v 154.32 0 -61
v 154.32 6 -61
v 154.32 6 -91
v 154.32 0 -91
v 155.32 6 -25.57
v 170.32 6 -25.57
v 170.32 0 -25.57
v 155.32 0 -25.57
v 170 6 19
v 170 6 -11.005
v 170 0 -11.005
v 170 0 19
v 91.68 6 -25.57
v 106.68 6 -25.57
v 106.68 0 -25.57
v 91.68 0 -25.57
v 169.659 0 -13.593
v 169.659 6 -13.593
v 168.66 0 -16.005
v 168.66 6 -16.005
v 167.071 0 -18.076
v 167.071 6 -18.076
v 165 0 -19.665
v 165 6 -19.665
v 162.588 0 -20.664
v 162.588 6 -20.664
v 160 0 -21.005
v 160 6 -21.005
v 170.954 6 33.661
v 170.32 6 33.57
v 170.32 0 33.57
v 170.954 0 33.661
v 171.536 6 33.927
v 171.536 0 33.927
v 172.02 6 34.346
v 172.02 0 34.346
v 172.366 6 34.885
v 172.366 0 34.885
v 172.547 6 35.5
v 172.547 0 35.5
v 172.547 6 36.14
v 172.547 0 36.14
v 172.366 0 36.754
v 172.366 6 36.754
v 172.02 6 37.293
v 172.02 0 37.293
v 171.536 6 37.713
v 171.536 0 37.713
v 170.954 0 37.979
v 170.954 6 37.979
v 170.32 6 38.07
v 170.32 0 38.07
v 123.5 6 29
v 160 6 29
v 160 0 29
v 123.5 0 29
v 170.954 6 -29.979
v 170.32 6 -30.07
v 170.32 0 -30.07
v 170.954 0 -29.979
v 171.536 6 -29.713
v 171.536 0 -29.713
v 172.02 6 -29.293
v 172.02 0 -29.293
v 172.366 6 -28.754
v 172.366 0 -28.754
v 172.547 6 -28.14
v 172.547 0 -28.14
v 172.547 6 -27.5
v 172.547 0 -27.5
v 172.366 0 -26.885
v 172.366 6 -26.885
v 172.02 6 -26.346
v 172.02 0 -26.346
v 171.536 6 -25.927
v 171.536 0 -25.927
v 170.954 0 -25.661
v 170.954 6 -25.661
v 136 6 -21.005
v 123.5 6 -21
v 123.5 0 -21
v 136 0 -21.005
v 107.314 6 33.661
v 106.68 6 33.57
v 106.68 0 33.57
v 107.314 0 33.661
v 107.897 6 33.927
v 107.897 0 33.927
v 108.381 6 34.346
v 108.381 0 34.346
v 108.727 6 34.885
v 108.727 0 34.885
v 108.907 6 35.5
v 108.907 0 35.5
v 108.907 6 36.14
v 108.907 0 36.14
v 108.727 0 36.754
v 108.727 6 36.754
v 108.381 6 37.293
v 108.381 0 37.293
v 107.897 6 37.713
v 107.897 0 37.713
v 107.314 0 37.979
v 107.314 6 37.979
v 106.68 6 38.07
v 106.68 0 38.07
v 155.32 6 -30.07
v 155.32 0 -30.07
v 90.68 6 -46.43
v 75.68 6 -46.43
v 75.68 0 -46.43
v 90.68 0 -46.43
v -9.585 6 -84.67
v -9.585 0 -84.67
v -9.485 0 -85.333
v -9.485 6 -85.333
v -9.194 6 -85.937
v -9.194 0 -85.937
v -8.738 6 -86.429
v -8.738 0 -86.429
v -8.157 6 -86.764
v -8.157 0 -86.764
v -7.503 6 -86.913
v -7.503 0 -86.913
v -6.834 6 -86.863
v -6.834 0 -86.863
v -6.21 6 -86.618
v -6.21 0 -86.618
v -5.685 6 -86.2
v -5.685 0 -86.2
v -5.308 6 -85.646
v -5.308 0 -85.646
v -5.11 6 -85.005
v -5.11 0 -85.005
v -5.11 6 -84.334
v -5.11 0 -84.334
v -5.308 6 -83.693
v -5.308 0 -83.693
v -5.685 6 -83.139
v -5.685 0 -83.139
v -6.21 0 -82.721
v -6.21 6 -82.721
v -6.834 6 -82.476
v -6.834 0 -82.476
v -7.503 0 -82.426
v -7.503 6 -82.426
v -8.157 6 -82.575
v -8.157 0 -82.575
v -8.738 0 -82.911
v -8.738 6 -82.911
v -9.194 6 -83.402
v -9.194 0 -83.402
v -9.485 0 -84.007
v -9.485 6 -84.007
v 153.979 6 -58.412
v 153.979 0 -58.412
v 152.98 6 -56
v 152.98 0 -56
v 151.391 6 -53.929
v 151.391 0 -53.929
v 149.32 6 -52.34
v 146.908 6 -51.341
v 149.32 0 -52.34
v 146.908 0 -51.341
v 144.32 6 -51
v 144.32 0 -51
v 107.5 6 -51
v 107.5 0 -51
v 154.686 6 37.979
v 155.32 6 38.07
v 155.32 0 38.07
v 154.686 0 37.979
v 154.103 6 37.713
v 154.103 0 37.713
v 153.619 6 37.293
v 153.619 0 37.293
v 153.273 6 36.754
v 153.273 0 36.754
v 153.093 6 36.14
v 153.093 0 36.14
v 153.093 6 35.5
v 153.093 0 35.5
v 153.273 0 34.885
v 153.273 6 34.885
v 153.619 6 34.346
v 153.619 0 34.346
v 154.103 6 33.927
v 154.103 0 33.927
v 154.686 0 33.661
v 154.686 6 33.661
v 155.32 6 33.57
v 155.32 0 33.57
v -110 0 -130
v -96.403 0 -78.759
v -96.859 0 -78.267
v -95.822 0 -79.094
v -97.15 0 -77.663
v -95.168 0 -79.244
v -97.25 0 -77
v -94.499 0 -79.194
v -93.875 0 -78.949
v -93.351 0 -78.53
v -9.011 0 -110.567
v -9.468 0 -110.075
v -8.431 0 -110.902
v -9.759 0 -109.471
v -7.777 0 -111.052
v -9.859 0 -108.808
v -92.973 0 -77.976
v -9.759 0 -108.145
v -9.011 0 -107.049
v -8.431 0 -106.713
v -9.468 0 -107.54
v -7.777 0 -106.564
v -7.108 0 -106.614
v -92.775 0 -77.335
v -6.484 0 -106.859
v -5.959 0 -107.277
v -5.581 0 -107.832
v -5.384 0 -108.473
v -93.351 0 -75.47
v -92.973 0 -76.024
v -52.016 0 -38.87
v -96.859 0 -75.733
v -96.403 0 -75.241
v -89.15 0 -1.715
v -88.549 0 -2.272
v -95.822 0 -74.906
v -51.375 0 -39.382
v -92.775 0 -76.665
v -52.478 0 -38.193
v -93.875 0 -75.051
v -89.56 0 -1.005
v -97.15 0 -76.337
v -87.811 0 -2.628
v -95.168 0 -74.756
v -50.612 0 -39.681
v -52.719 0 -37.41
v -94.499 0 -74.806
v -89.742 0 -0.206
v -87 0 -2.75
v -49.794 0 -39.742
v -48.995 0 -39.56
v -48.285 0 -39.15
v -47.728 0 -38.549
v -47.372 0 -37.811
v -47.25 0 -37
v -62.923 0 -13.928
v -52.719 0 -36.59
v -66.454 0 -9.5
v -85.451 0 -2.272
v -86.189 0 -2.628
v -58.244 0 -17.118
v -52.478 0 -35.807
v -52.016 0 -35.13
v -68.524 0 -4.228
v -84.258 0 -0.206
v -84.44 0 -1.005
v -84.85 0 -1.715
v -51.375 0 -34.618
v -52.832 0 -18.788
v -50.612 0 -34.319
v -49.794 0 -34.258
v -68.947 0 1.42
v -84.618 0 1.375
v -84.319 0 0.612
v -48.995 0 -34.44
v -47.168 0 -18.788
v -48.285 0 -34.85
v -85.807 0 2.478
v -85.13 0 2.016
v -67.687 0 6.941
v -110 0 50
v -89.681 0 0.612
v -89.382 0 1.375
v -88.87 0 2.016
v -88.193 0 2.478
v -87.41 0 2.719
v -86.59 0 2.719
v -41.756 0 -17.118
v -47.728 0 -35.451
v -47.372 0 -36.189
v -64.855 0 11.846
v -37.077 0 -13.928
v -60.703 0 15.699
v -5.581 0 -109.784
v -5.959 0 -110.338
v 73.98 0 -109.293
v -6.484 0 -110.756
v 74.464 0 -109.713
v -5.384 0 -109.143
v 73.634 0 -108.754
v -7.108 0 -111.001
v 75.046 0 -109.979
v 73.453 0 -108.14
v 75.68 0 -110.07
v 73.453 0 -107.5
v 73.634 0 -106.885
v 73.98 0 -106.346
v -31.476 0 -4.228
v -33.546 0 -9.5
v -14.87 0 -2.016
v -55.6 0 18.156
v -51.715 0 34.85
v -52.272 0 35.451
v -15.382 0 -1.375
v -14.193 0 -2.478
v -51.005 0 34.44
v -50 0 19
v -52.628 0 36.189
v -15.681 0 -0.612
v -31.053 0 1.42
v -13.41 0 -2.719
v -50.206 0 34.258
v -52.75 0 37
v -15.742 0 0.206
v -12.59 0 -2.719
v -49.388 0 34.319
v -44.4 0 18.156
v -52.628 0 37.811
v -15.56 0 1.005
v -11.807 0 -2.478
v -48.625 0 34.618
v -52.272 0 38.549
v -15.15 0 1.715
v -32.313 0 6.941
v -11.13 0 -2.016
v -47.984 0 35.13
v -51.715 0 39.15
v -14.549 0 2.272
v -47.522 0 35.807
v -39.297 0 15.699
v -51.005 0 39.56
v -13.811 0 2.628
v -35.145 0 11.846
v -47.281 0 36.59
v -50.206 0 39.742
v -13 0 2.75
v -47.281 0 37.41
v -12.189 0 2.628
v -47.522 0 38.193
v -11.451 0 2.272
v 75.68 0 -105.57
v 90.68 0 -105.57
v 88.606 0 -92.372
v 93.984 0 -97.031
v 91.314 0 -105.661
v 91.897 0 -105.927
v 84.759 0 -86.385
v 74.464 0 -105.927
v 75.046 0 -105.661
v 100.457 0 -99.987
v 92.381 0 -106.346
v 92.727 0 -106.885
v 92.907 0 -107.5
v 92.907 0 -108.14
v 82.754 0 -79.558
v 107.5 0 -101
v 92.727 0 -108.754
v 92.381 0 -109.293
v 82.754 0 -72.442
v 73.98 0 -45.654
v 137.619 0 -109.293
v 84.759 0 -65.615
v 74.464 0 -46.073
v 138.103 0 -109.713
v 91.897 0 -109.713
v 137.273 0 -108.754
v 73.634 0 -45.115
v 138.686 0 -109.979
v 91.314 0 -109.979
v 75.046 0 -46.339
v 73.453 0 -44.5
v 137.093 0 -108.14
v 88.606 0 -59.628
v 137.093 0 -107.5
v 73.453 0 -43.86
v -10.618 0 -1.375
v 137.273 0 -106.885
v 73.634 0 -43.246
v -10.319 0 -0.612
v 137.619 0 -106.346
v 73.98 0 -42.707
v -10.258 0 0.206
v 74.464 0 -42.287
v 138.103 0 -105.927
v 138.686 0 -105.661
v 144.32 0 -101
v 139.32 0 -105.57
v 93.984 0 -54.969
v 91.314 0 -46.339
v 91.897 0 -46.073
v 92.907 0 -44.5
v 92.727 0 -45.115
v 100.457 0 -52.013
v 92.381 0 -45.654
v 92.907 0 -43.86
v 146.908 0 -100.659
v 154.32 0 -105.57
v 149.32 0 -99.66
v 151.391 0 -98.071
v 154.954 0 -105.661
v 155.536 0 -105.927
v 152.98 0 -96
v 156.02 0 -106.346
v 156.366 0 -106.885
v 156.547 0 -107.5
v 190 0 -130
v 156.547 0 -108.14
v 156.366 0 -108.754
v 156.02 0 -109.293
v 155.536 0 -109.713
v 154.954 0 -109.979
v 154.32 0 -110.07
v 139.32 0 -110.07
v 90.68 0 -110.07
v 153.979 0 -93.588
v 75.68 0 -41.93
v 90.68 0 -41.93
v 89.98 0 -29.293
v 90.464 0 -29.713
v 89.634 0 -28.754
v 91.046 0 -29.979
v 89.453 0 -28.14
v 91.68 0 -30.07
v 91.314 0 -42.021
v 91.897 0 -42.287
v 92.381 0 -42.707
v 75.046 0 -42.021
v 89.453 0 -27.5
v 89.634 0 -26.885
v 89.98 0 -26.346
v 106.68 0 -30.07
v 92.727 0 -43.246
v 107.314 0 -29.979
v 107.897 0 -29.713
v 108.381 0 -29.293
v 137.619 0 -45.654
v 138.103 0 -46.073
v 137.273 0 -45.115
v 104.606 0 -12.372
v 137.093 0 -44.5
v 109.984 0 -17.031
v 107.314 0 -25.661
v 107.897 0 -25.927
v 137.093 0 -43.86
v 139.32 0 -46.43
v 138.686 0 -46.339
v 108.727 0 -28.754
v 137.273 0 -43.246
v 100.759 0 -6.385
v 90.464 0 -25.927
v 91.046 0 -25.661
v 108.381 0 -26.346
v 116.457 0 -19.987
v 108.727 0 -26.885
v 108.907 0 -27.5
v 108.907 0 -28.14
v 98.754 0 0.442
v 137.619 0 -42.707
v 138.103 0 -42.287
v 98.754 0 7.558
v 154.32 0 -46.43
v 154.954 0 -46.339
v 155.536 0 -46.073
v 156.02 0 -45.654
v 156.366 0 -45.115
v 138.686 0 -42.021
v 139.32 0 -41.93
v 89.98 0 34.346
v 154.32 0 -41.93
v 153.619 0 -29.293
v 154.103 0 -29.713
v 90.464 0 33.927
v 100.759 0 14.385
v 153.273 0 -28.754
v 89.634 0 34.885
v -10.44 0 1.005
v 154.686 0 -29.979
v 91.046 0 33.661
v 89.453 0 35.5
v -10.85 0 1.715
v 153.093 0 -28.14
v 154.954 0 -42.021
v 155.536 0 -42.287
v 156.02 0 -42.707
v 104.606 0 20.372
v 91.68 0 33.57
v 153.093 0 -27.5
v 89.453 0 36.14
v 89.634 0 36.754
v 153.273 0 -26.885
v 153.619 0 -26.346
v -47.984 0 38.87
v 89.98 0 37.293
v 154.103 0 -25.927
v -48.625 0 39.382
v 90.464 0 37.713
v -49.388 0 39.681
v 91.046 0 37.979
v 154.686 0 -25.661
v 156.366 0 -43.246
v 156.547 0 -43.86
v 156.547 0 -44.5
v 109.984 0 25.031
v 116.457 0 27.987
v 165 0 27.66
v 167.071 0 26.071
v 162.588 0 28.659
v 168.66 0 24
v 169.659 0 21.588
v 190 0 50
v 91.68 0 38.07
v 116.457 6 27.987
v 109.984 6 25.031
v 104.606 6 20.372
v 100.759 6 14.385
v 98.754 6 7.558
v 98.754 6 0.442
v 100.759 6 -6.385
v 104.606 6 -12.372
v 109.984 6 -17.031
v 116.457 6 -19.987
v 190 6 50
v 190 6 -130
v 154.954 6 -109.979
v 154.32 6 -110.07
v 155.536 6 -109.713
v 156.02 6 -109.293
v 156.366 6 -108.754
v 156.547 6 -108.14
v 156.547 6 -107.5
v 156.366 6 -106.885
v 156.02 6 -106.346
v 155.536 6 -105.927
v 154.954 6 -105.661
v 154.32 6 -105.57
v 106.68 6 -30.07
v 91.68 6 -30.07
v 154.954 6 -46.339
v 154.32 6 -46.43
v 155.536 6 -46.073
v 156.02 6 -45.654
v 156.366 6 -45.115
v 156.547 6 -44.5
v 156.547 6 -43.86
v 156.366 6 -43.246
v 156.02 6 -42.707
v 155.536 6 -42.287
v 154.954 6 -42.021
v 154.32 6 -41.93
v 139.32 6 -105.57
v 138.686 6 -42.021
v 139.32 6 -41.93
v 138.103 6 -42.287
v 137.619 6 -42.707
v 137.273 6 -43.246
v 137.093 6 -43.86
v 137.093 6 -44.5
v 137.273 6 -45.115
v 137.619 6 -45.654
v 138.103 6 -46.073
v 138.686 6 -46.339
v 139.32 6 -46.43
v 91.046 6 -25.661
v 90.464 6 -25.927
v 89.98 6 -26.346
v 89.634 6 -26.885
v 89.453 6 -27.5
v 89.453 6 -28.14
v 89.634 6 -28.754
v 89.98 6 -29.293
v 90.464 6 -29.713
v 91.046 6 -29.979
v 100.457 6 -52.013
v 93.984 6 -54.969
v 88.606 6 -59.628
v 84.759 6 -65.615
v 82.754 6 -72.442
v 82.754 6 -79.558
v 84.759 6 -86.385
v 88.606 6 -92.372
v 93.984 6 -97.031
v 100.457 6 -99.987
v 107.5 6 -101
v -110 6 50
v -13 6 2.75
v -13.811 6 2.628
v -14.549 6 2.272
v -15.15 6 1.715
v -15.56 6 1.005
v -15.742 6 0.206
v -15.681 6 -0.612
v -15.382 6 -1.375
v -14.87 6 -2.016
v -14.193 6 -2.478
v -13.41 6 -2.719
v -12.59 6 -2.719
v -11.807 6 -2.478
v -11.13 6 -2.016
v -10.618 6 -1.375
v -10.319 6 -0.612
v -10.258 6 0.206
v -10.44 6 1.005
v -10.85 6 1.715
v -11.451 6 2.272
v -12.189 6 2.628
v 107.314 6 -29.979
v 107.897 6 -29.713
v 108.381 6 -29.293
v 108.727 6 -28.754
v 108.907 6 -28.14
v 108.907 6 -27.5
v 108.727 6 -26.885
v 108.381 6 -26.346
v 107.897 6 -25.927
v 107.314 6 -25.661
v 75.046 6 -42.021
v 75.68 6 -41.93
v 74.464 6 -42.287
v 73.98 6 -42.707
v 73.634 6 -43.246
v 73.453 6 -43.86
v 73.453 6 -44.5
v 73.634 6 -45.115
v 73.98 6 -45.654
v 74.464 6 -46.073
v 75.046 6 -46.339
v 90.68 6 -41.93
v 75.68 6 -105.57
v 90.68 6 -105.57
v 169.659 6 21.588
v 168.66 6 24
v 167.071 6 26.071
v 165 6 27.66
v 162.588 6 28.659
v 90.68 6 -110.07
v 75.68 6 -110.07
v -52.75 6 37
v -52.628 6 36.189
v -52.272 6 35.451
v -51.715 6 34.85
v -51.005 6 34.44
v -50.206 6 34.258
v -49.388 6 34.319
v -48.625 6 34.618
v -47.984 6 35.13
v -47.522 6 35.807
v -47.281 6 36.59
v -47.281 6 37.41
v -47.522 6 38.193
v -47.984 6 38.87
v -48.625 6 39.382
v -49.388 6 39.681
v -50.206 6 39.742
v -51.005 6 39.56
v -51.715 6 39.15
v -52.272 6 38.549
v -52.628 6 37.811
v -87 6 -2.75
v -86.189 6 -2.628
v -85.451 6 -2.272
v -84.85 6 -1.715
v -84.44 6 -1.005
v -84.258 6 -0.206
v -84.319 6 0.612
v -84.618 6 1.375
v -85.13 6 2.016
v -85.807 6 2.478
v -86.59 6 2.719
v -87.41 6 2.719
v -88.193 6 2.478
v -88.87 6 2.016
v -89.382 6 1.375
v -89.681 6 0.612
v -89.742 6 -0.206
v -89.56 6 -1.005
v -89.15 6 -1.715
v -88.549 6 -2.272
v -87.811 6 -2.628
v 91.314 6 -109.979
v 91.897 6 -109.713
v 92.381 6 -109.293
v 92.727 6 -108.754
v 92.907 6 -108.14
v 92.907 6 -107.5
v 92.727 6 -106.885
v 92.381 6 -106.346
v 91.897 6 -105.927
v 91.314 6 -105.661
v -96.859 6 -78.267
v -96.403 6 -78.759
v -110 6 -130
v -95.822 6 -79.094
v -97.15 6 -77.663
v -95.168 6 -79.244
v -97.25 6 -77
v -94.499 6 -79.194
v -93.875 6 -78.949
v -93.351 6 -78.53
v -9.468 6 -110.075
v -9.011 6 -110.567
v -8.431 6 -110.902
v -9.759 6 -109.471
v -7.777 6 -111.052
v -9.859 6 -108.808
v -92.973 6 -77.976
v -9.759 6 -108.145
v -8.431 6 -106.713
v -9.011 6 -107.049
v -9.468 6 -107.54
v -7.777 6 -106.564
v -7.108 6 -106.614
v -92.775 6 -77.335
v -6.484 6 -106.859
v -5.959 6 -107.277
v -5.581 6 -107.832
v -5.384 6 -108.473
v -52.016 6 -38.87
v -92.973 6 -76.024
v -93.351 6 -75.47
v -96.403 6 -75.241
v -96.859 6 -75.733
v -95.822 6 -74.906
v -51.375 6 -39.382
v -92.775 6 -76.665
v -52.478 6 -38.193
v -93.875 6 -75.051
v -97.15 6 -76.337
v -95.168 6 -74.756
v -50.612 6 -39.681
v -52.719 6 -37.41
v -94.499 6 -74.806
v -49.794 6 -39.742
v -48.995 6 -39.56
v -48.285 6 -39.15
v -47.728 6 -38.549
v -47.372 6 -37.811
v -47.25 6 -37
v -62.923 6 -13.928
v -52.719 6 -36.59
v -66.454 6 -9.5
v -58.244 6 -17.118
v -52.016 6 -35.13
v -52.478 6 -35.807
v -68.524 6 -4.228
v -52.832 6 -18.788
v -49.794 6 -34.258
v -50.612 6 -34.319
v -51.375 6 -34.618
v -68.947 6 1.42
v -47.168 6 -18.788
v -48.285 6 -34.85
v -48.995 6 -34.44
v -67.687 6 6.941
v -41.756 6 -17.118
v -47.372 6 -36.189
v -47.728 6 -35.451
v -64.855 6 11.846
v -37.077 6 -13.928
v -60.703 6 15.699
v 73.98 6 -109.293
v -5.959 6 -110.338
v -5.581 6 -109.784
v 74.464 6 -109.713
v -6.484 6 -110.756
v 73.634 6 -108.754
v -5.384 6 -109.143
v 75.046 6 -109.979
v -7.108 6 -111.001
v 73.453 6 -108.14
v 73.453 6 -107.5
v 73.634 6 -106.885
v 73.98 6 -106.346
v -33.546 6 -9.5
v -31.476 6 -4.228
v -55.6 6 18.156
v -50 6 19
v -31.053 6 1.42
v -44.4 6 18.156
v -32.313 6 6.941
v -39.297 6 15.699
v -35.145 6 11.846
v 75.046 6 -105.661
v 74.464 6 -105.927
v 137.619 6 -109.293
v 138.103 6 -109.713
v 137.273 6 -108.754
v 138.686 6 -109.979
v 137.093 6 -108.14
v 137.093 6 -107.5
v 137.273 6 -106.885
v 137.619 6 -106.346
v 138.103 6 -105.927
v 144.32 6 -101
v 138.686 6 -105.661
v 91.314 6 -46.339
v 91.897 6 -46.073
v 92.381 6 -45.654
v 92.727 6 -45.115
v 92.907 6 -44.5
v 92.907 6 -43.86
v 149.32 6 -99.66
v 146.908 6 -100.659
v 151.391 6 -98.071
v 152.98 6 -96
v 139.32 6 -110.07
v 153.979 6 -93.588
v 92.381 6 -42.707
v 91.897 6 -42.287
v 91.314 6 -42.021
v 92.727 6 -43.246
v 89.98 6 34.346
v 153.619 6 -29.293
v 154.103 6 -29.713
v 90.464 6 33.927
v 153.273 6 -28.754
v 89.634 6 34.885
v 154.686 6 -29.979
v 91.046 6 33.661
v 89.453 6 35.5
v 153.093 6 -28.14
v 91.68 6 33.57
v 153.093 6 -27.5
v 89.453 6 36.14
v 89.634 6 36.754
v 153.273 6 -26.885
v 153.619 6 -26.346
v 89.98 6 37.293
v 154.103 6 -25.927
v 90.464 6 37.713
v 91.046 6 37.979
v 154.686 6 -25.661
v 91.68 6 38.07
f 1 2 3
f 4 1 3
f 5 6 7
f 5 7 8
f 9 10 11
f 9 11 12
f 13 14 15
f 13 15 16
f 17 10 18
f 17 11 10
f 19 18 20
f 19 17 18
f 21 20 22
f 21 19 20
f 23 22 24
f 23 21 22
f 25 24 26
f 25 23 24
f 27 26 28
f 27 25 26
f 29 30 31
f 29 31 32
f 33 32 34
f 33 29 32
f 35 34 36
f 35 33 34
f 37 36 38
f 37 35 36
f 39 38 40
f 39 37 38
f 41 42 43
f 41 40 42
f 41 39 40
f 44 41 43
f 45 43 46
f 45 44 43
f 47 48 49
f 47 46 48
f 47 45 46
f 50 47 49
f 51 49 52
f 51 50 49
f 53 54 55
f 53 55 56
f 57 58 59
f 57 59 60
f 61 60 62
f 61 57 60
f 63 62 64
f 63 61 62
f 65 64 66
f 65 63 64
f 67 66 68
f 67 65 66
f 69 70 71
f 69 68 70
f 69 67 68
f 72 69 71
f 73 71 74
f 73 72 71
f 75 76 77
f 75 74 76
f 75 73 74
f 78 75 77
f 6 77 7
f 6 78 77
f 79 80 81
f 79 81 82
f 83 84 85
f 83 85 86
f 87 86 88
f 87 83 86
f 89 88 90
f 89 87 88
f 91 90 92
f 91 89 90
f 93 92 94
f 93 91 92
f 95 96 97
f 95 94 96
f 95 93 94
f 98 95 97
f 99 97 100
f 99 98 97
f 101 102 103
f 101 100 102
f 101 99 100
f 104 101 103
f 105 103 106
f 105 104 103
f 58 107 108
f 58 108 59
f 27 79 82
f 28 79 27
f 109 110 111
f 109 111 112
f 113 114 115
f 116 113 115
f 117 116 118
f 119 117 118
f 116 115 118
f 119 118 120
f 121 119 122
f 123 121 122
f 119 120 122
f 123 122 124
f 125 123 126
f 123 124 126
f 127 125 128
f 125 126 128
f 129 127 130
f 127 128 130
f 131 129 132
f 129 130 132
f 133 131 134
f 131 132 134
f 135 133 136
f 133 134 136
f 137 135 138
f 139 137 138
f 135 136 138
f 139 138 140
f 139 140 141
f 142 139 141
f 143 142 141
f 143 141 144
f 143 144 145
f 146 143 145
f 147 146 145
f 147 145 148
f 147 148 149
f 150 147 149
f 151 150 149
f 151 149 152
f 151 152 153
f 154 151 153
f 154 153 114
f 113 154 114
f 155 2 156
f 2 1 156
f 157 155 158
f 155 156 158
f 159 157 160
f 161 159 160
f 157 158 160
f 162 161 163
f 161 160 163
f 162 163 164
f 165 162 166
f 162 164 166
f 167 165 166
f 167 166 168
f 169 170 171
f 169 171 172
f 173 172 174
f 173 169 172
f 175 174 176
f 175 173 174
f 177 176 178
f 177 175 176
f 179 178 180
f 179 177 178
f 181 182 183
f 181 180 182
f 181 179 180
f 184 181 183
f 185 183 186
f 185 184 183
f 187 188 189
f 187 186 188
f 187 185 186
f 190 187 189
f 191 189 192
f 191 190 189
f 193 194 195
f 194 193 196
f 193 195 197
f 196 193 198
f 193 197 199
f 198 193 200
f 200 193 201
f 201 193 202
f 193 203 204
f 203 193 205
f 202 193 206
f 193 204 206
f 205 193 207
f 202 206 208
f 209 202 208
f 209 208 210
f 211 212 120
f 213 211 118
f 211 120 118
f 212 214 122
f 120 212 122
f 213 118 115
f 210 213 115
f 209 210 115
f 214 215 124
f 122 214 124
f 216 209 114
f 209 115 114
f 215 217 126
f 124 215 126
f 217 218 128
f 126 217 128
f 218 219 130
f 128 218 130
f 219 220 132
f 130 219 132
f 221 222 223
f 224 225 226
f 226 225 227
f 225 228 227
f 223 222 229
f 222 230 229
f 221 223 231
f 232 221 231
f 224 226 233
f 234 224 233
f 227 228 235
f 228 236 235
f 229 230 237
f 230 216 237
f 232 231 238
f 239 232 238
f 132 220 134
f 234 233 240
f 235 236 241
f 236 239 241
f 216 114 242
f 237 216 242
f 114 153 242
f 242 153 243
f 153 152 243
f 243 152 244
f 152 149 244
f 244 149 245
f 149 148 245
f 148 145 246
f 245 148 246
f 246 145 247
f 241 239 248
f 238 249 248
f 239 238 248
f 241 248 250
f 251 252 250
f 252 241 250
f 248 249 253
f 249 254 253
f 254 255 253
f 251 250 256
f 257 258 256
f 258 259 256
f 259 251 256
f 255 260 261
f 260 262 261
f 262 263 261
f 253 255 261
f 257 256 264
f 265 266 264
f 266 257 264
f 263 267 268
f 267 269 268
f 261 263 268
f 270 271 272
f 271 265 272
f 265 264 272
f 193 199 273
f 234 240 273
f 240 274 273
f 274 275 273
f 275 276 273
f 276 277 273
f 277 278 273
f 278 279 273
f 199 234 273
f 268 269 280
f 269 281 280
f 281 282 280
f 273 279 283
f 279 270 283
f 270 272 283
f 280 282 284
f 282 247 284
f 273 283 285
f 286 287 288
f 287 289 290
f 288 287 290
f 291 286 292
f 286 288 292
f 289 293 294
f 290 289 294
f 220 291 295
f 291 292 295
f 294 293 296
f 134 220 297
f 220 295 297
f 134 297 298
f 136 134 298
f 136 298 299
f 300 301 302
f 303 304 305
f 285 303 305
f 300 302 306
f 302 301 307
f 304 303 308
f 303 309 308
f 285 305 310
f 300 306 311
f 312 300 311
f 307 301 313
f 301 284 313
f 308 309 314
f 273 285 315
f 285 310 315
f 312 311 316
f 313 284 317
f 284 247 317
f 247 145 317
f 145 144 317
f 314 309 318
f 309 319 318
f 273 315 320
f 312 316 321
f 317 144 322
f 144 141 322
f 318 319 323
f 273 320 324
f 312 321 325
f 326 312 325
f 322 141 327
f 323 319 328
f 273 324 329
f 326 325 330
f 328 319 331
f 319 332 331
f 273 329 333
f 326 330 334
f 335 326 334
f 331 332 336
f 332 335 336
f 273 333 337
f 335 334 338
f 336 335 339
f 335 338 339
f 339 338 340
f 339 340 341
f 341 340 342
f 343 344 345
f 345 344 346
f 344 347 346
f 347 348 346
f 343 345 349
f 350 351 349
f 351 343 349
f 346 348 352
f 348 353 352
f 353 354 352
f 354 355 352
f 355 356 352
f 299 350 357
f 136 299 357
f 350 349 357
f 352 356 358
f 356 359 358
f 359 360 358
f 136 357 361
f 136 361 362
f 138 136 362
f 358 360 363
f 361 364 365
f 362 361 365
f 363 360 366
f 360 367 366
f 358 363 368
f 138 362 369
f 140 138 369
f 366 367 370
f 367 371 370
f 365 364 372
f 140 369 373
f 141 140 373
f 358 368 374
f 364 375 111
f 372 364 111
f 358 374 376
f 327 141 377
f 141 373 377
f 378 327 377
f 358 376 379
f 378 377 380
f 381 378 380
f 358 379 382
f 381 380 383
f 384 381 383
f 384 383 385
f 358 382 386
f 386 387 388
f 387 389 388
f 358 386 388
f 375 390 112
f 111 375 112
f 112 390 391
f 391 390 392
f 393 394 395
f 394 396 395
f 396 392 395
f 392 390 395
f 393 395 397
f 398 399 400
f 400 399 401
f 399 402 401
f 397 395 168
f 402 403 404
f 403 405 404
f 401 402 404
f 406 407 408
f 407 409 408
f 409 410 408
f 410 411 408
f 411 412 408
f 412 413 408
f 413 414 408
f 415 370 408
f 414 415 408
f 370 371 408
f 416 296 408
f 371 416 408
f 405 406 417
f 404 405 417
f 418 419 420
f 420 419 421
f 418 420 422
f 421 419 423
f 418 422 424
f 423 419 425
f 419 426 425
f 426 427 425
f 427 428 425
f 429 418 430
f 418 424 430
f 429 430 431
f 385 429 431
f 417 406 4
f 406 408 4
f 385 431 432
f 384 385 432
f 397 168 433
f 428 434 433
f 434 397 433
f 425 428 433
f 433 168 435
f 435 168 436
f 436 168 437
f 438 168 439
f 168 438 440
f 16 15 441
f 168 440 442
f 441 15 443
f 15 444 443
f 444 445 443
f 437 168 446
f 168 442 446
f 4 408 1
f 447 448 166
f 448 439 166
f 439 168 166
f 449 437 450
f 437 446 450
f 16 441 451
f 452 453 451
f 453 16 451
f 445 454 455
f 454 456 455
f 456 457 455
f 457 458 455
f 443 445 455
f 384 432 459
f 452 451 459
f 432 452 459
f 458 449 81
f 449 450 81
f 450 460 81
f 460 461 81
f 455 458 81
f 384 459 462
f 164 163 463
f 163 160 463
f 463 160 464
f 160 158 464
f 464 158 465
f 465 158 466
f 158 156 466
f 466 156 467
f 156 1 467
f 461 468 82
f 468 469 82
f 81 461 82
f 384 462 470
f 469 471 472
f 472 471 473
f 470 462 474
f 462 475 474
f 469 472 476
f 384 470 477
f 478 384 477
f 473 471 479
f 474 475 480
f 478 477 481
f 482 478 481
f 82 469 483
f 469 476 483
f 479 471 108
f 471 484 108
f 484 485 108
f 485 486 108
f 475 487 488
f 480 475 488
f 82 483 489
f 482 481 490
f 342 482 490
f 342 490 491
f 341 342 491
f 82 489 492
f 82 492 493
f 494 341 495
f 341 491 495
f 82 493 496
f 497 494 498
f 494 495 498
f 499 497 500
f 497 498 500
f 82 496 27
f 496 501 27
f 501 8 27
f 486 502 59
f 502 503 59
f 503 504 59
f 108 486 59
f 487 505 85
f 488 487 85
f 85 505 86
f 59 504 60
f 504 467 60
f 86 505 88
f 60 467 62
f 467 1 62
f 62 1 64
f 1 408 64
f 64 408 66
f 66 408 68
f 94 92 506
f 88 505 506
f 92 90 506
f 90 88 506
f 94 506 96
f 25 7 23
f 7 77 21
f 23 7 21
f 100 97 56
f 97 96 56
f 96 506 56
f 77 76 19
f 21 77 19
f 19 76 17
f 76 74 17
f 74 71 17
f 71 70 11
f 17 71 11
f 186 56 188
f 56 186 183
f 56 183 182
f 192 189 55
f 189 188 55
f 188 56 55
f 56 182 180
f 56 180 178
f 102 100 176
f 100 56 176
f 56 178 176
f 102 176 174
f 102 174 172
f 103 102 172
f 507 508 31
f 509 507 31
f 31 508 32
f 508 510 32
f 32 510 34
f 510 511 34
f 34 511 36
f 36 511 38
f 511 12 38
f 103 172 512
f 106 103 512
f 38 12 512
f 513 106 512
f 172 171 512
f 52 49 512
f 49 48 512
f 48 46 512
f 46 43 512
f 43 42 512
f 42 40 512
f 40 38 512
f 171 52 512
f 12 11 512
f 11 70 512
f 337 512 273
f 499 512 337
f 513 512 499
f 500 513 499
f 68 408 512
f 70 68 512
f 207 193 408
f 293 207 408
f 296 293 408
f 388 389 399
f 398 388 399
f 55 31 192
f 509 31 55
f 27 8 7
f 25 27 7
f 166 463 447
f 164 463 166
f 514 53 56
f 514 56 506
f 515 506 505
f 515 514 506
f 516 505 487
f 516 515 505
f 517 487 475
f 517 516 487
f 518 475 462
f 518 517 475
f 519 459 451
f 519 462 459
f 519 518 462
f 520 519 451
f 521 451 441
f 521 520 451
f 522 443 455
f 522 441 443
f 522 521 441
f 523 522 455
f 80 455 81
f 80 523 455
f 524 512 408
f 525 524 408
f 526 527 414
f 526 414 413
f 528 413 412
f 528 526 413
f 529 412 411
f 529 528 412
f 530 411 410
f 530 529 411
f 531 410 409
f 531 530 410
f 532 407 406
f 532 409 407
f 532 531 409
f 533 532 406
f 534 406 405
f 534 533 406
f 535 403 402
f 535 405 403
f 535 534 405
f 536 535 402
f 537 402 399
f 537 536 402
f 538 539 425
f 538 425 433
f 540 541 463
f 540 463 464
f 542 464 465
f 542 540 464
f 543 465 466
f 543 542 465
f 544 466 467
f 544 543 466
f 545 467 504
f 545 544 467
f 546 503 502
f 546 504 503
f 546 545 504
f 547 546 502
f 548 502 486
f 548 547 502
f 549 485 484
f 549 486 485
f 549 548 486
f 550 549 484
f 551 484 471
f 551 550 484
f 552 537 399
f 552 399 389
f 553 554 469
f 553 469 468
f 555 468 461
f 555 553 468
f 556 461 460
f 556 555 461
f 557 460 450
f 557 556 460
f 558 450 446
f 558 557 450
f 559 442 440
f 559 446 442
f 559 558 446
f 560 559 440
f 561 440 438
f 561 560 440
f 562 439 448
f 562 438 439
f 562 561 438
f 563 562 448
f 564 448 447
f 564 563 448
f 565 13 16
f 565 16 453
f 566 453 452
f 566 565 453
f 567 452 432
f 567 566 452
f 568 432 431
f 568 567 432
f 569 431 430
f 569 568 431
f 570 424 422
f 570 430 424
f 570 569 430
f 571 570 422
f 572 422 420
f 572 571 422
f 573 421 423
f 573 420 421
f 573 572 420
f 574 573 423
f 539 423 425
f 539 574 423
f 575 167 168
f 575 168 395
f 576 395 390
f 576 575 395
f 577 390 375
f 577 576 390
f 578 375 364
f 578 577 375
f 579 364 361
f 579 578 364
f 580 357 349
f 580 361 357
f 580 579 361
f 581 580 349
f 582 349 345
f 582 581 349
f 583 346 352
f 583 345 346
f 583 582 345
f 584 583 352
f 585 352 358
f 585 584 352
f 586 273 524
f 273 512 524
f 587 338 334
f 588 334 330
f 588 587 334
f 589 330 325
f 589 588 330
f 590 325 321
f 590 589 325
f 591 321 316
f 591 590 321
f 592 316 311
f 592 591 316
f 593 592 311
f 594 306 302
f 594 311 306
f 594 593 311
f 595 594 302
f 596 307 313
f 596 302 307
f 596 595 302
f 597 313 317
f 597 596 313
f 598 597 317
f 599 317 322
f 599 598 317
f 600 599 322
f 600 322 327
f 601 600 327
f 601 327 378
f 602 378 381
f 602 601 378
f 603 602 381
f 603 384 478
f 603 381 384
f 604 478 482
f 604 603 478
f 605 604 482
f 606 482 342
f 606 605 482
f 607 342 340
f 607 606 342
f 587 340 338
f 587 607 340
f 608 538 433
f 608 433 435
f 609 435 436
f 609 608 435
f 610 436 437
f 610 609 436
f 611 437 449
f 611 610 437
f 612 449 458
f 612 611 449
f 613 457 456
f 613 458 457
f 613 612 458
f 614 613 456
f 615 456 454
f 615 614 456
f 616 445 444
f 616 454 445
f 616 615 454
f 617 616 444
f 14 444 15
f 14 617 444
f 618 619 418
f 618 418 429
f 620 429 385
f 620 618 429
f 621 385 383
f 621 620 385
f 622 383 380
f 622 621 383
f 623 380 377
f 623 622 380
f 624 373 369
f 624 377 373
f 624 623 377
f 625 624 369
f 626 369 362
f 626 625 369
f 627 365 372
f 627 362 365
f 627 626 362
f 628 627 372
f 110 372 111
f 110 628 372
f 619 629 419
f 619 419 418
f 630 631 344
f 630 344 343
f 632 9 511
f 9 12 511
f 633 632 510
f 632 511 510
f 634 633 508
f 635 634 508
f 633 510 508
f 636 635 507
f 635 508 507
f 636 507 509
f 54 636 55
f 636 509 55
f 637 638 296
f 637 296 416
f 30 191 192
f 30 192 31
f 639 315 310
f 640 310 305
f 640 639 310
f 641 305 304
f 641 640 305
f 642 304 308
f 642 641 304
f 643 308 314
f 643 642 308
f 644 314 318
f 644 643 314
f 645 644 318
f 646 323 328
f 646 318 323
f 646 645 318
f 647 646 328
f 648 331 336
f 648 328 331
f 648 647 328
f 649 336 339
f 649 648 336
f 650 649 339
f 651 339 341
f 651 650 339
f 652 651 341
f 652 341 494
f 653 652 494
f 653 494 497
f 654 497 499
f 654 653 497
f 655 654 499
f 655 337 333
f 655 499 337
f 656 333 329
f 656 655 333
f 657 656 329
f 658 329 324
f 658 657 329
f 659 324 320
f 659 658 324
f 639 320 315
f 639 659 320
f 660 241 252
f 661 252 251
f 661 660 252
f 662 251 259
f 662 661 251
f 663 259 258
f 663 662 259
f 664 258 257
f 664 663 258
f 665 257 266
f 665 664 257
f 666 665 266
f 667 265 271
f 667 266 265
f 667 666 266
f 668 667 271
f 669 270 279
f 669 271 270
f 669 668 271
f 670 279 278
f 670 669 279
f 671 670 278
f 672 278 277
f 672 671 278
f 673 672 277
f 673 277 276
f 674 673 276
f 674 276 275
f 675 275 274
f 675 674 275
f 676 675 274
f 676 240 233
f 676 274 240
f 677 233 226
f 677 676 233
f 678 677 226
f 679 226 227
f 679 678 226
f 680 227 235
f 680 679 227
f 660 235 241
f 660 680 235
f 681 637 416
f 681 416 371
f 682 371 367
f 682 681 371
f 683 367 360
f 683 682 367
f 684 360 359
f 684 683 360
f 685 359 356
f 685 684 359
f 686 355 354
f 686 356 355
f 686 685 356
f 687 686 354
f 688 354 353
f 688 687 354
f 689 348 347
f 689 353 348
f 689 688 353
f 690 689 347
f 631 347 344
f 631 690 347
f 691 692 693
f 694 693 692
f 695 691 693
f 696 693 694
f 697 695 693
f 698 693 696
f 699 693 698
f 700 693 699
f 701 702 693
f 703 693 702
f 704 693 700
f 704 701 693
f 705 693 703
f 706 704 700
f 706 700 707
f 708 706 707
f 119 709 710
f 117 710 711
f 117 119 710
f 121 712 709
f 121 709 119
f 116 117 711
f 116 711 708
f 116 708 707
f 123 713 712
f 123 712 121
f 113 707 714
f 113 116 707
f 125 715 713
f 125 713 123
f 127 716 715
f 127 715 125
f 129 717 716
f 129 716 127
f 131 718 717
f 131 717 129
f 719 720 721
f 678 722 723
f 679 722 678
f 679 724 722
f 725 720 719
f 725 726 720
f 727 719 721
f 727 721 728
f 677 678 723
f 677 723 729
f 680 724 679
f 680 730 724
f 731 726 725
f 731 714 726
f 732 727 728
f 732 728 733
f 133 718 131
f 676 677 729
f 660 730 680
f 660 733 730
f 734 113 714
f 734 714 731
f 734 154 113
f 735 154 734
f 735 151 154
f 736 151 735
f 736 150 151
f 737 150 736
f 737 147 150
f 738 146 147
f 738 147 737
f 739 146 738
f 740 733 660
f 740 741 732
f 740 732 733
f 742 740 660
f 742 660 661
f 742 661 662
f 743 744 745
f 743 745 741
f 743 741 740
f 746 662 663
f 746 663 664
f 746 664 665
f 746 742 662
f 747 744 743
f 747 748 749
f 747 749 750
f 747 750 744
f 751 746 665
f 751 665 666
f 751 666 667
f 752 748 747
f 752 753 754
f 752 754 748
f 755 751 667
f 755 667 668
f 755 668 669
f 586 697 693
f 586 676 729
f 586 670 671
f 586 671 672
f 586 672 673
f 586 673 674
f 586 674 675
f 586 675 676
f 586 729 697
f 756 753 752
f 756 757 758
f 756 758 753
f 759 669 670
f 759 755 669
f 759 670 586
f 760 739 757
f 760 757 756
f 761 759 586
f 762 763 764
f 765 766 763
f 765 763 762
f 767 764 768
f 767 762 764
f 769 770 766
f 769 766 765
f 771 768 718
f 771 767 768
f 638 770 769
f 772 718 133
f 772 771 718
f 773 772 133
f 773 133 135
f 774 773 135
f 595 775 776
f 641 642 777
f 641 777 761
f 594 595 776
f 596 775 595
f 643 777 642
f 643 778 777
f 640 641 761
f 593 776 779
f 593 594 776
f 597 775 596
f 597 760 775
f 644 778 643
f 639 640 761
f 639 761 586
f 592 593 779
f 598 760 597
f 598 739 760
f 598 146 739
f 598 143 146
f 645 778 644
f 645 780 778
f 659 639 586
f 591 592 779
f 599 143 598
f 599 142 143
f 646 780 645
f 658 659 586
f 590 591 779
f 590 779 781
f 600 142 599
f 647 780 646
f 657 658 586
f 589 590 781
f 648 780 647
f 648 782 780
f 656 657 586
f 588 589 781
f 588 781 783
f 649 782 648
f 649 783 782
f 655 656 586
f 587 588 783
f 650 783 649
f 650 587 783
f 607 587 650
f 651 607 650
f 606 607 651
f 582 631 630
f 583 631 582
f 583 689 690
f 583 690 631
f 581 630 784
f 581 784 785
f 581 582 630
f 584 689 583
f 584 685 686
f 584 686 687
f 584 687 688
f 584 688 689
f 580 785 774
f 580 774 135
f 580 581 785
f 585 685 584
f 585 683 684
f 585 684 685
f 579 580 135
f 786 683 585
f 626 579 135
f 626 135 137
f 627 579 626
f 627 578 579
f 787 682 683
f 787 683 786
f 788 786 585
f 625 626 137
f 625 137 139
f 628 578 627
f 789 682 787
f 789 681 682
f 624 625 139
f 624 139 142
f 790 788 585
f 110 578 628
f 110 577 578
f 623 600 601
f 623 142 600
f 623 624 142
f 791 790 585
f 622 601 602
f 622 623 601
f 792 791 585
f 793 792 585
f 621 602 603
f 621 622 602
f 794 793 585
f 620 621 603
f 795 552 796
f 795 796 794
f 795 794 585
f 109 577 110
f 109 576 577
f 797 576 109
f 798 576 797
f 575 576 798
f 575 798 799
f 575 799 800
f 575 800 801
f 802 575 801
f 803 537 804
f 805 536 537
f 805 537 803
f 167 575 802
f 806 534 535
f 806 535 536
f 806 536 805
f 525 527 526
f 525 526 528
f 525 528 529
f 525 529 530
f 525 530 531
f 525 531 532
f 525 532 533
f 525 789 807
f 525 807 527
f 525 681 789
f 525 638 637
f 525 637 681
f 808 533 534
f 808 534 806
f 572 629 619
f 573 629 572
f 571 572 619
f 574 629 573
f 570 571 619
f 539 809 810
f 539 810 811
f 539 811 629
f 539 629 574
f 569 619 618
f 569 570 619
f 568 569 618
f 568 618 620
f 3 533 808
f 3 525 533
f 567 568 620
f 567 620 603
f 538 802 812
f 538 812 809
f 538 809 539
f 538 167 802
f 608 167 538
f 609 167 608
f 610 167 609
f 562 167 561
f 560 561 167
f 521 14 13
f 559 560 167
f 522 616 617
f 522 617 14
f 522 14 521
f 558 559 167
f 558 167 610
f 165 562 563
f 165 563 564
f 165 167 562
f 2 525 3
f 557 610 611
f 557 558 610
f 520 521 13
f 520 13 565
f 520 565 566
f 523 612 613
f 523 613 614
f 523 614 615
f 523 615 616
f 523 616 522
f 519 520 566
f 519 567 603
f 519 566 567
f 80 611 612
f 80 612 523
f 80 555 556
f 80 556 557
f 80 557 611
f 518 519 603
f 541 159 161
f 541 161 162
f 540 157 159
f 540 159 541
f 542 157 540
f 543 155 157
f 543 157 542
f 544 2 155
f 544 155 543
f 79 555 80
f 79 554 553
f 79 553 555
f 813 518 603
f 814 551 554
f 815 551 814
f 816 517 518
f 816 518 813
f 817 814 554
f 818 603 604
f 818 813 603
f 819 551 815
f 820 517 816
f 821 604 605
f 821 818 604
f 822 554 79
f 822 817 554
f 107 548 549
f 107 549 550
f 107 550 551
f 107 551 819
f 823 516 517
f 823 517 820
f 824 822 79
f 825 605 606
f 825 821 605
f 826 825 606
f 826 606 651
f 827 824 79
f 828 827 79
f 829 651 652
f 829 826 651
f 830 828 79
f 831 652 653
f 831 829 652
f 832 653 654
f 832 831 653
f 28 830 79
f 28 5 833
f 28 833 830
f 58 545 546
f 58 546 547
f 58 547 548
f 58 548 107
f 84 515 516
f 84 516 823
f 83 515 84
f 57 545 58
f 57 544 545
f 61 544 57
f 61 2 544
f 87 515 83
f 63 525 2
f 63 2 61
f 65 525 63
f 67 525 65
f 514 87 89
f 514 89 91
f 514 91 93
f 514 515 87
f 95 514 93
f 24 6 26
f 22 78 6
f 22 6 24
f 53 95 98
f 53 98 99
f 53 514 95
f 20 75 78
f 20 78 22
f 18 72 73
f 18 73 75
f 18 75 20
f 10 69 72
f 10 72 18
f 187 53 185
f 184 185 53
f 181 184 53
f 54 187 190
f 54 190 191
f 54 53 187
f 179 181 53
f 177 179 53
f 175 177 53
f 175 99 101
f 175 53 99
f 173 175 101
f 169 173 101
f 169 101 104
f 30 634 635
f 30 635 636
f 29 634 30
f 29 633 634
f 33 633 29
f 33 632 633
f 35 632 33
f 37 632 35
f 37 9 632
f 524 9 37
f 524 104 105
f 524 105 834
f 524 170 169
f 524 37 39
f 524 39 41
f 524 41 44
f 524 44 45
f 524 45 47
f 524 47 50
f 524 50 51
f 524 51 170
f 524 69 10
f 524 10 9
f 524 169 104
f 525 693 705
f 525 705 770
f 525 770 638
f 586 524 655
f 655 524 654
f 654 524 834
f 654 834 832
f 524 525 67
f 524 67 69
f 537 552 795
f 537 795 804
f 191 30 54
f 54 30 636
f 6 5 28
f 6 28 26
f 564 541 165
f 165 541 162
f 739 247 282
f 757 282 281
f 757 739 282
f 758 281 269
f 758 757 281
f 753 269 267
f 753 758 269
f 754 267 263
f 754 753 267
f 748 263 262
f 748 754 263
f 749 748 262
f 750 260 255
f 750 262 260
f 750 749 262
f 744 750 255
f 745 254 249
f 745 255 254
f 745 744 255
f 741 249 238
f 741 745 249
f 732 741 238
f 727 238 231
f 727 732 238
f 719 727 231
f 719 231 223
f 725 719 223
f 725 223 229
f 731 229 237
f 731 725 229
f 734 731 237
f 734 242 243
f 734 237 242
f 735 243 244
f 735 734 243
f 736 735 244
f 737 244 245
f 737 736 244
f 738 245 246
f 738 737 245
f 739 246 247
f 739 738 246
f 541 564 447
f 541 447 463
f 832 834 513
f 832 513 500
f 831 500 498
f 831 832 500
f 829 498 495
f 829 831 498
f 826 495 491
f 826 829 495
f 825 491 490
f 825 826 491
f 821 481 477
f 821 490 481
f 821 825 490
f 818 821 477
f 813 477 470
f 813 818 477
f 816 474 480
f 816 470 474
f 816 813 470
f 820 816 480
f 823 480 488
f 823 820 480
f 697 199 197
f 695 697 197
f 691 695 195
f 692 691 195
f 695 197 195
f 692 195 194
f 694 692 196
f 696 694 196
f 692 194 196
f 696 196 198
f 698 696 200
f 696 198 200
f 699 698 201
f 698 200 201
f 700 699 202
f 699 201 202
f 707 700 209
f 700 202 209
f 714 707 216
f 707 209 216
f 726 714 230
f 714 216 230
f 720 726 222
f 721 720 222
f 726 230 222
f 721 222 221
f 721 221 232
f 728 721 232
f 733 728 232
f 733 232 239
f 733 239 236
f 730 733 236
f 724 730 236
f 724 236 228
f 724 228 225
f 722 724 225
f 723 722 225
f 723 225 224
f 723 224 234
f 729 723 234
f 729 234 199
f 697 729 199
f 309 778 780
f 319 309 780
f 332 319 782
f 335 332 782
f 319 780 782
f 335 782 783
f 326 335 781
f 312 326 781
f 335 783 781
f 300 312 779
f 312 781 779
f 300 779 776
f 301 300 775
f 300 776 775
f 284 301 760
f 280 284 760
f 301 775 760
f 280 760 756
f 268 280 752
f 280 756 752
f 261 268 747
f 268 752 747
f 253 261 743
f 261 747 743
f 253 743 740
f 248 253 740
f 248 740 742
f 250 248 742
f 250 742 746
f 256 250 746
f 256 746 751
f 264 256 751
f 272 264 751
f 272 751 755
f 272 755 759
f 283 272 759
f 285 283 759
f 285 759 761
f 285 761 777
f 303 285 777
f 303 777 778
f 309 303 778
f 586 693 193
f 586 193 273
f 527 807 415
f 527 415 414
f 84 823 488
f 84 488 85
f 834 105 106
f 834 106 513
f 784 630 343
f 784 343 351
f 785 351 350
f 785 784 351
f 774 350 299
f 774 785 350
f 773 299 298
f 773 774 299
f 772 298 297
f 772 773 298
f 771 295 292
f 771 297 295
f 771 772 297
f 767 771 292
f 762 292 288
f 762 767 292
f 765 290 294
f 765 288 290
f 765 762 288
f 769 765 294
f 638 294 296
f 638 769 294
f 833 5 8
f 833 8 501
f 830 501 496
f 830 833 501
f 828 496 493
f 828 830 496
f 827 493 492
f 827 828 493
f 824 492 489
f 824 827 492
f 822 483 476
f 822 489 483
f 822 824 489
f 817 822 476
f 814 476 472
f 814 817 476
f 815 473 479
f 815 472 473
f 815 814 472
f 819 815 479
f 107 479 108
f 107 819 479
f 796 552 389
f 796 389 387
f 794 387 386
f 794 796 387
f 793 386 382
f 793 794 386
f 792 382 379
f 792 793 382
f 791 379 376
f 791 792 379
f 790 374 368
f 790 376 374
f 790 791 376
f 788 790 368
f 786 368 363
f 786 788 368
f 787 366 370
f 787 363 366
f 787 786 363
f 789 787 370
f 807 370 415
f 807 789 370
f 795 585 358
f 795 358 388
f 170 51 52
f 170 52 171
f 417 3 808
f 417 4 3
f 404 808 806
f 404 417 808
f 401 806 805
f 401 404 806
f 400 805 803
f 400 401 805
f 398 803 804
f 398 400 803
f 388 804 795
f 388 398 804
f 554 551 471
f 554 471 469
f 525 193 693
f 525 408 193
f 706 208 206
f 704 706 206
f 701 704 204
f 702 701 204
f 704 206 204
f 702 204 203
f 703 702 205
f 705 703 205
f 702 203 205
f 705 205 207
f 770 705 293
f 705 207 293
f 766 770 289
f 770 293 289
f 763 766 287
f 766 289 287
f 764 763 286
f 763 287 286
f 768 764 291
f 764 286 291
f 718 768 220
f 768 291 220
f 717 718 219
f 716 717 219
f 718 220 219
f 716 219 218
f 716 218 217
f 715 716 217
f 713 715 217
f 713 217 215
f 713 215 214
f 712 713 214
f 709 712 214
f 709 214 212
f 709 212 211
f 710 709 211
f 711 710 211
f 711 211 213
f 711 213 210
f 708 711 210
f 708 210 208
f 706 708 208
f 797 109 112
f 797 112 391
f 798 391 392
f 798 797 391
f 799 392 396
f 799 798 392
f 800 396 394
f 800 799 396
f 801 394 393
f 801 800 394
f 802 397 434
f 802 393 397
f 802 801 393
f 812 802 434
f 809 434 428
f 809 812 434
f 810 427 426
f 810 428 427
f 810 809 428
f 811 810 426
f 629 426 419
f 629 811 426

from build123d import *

# Parameters (mm, degrees)
SKETCH1_W            = 290
SKETCH1_H            = 180
BOSS_EXTRUDE1_DEPTH  = 6
SKETCH2_R            = 19
CUT_EXTRUDE1_DEPTH   = 231.295462396
M4_CLEARANCE_HOLE1_D = 4.5
CUT_EXTRUDE3_DEPTH   = 10
CUT_EXTRUDE4_DEPTH   = 10
CUT_EXTRUDE5_DEPTH   = 231.295462396
FILLET1_R            = 10
SKETCH12_W           = 39.319805153
SKETCH12_H           = 50
CUT_EXTRUDE6_DEPTH   = 10
FILLET2_R            = 10
CIRPATTERN1_COUNT    = 4
SKETCH15_W           = 180
SKETCH15_H           = 6
BOSS_EXTRUDE2_DEPTH  = 10


with BuildPart() as part:
    # Sketch1 → Boss-Extrude1 (new body)
    with BuildSketch(Plane(origin=(0, 0, 0), x_dir=(1, 0, 0), z_dir=(0, 1, 0))):
        with Locations((45, 40)):
            Rectangle(SKETCH1_W, SKETCH1_H)
    extrude(amount=BOSS_EXTRUDE1_DEPTH)

    # Sketch2 → Cut-Extrude1 (cut, through all)
    with BuildSketch(Plane(origin=(0, 6, 0), x_dir=(1, 0, 0), z_dir=(0, 1, 0))):
        with Locations((-50, 0)):
            Circle(SKETCH2_R)
    extrude(amount=-CUT_EXTRUDE1_DEPTH, mode=Mode.SUBTRACT)

    # M4 Clearance Hole1 (through all)
    with Locations(Plane(origin=(0, 6, 0), x_dir=(1, 0, 0), z_dir=(0, 1, 0))):
        with Locations((-95, 77), (-7.608586267, 108.807873329), (-7.334866568, 84.669705362)):
            Hole(M4_CLEARANCE_HOLE1_D / 2)

    # Sketch8 → Cut-Extrude3 (cut)
    with BuildSketch(Plane(origin=(0, 6, 0), x_dir=(1, 0, 0), z_dir=(0, 1, 0))):
        with BuildLine():
            Line((75.680194847, 110.069805153), (90.680194847, 110.069805153))
            ThreePointArc((90.680194847, 110.069805153), (92.930194847, 107.819805153), (90.680194847, 105.569805153))
            Line((90.680194847, 105.569805153), (75.680194847, 105.569805153))
            ThreePointArc((75.680194847, 105.569805153), (73.430194847, 107.819805153), (75.680194847, 110.069805153))
        make_face()
        with BuildLine():
            Line((139.319805153, 110.069805153), (154.319805153, 110.069805153))
            ThreePointArc((154.319805153, 110.069805153), (156.569805153, 107.819805153), (154.319805153, 105.569805153))
            Line((154.319805153, 105.569805153), (139.319805153, 105.569805153))
            ThreePointArc((139.319805153, 105.569805153), (137.069805153, 107.819805153), (139.319805153, 110.069805153))
        make_face()
        with BuildLine():
            Line((75.680194847, 46.430194847), (90.680194847, 46.430194847))
            ThreePointArc((90.680194847, 46.430194847), (92.930194847, 44.180194847), (90.680194847, 41.930194847))
            Line((90.680194847, 41.930194847), (75.680194847, 41.930194847))
            ThreePointArc((75.680194847, 41.930194847), (73.430194847, 44.180194847), (75.680194847, 46.430194847))
        make_face()
        with BuildLine():
            Line((139.319805153, 46.430194847), (154.319805153, 46.430194847))
            ThreePointArc((154.319805153, 46.430194847), (156.569805153, 44.180194847), (154.319805153, 41.930194847))
            Line((154.319805153, 41.930194847), (139.319805153, 41.930194847))
            ThreePointArc((139.319805153, 41.930194847), (137.069805153, 44.180194847), (139.319805153, 46.430194847))
        make_face()
        with BuildLine():
            Line((107.5, 101), (122.5, 101))
            ThreePointArc((122.5, 101), (147.5, 76), (122.5, 51))
            Line((122.5, 51), (107.5, 51))
            ThreePointArc((107.5, 51), (82.5, 76), (107.5, 101))
        make_face()
    extrude(amount=-CUT_EXTRUDE3_DEPTH, mode=Mode.SUBTRACT)

    # Sketch9 → Cut-Extrude4 (cut)
    with BuildSketch(Plane(origin=(0, 6, 0), x_dir=(1, 0, 0), z_dir=(0, 1, 0))):
        with BuildLine():
            Line((91.680194847, 30.069805153), (106.680194847, 30.069805153))
            ThreePointArc((106.680194847, 30.069805153), (108.930194847, 27.819805153), (106.680194847, 25.569805153))
            Line((106.680194847, 25.569805153), (91.680194847, 25.569805153))
            ThreePointArc((91.680194847, 25.569805153), (89.430194847, 27.819805153), (91.680194847, 30.069805153))
        make_face()
        with BuildLine():
            Line((155.319805153, 30.069805153), (170.319805153, 30.069805153))
            ThreePointArc((170.319805153, 30.069805153), (172.569805153, 27.819805153), (170.319805153, 25.569805153))
            Line((170.319805153, 25.569805153), (155.319805153, 25.569805153))
            ThreePointArc((155.319805153, 25.569805153), (153.069805153, 27.819805153), (155.319805153, 30.069805153))
        make_face()
        with BuildLine():
            Line((91.680194847, -33.569805153), (106.680194847, -33.569805153))
            ThreePointArc((106.680194847, -33.569805153), (108.930194847, -35.819805153), (106.680194847, -38.069805153))
            Line((106.680194847, -38.069805153), (91.680194847, -38.069805153))
            ThreePointArc((91.680194847, -38.069805153), (89.430194847, -35.819805153), (91.680194847, -33.569805153))
        make_face()
        with BuildLine():
            Line((155.319805153, -33.569805153), (170.319805153, -33.569805153))
            ThreePointArc((170.319805153, -33.569805153), (172.569805153, -35.819805153), (170.319805153, -38.069805153))
            Line((170.319805153, -38.069805153), (155.319805153, -38.069805153))
            ThreePointArc((155.319805153, -38.069805153), (153.069805153, -35.819805153), (155.319805153, -33.569805153))
        make_face()
        with BuildLine():
            Line((123.5, 21), (138.5, 21))
            ThreePointArc((138.5, 21), (163.5, -4), (138.5, -29))
            Line((138.5, -29), (123.5, -29))
            ThreePointArc((123.5, -29), (98.5, -4), (123.5, 21))
        make_face()
    extrude(amount=-CUT_EXTRUDE4_DEPTH, mode=Mode.SUBTRACT)

    # Sketch10 → Cut-Extrude5 (cut, through all)
    with BuildSketch(Plane(origin=(0, 6, 0), x_dir=(1, 0, 0), z_dir=(0, 1, 0))):
        with BuildLine():
            Line((123.5, 21), (136, 21.004881403))
            Line((136, 21.004881403), (170, 21.004881403))
            Line((170, 21.004881403), (170, -29))
            Line((170, -29), (136, -29))
            Line((136, -29), (123.5, -29))
            ThreePointArc((123.5, -29), (98.5, -4), (123.5, 21))
        make_face()
    extrude(amount=-CUT_EXTRUDE5_DEPTH, mode=Mode.SUBTRACT)

    # Fillet1
    fillet1_edges = [part.edges().sort_by_distance(p)[0] for p in [
        (170, 3, 29),
        (170, 3, -21.004881403),
    ]]
    fillet(fillet1_edges, radius=FILLET1_R)

    # Sketch12 → Cut-Extrude6 (cut)
    with BuildSketch(Plane(origin=(0, 6, 0), x_dir=(1, 0, 0), z_dir=(0, 1, 0))):
        with Locations((134.659902577, 76)):
            Rectangle(SKETCH12_W, SKETCH12_H)
    extrude(amount=-CUT_EXTRUDE6_DEPTH, mode=Mode.SUBTRACT)

    # Fillet2
    fillet2_edges = [part.edges().sort_by_distance(p)[0] for p in [
        (154.319805153, 3, -101),
        (154.319805153, 3, -51),
    ]]
    fillet(fillet2_edges, radius=FILLET2_R)

    # Sketch14 → M5 Clearance Hole2 (revolve, cut)
    with BuildSketch(Plane(origin=(-13, 6, 0), x_dir=(0, 0, 1), z_dir=(1, 0, 0))):
        Polygon((0, 0), (0, 21.652366702), (2.75, 20), (2.75, 0), align=None)
    m5_clearance_hole2 = revolve(axis=Axis((-13, 12.35, 0), (0, -1, 0)), mode=Mode.SUBTRACT)

    # CirPattern1: M5 Clearance Hole2 ×4 about axis
    cirpattern1_axis = Axis((-50, 0, 0), (0, 1, 0))
    for i in range(1, CIRPATTERN1_COUNT):
        add(m5_clearance_hole2.rotate(cirpattern1_axis, i * 360 / CIRPATTERN1_COUNT), mode=Mode.SUBTRACT)

    # Sketch15 → Boss-Extrude2 (add)
    with BuildSketch(Plane.ZY.offset(100)):
        with Locations((-40, 3)):
            Rectangle(SKETCH15_W, SKETCH15_H)
    extrude(amount=BOSS_EXTRUDE2_DEPTH)


solid = part.part
